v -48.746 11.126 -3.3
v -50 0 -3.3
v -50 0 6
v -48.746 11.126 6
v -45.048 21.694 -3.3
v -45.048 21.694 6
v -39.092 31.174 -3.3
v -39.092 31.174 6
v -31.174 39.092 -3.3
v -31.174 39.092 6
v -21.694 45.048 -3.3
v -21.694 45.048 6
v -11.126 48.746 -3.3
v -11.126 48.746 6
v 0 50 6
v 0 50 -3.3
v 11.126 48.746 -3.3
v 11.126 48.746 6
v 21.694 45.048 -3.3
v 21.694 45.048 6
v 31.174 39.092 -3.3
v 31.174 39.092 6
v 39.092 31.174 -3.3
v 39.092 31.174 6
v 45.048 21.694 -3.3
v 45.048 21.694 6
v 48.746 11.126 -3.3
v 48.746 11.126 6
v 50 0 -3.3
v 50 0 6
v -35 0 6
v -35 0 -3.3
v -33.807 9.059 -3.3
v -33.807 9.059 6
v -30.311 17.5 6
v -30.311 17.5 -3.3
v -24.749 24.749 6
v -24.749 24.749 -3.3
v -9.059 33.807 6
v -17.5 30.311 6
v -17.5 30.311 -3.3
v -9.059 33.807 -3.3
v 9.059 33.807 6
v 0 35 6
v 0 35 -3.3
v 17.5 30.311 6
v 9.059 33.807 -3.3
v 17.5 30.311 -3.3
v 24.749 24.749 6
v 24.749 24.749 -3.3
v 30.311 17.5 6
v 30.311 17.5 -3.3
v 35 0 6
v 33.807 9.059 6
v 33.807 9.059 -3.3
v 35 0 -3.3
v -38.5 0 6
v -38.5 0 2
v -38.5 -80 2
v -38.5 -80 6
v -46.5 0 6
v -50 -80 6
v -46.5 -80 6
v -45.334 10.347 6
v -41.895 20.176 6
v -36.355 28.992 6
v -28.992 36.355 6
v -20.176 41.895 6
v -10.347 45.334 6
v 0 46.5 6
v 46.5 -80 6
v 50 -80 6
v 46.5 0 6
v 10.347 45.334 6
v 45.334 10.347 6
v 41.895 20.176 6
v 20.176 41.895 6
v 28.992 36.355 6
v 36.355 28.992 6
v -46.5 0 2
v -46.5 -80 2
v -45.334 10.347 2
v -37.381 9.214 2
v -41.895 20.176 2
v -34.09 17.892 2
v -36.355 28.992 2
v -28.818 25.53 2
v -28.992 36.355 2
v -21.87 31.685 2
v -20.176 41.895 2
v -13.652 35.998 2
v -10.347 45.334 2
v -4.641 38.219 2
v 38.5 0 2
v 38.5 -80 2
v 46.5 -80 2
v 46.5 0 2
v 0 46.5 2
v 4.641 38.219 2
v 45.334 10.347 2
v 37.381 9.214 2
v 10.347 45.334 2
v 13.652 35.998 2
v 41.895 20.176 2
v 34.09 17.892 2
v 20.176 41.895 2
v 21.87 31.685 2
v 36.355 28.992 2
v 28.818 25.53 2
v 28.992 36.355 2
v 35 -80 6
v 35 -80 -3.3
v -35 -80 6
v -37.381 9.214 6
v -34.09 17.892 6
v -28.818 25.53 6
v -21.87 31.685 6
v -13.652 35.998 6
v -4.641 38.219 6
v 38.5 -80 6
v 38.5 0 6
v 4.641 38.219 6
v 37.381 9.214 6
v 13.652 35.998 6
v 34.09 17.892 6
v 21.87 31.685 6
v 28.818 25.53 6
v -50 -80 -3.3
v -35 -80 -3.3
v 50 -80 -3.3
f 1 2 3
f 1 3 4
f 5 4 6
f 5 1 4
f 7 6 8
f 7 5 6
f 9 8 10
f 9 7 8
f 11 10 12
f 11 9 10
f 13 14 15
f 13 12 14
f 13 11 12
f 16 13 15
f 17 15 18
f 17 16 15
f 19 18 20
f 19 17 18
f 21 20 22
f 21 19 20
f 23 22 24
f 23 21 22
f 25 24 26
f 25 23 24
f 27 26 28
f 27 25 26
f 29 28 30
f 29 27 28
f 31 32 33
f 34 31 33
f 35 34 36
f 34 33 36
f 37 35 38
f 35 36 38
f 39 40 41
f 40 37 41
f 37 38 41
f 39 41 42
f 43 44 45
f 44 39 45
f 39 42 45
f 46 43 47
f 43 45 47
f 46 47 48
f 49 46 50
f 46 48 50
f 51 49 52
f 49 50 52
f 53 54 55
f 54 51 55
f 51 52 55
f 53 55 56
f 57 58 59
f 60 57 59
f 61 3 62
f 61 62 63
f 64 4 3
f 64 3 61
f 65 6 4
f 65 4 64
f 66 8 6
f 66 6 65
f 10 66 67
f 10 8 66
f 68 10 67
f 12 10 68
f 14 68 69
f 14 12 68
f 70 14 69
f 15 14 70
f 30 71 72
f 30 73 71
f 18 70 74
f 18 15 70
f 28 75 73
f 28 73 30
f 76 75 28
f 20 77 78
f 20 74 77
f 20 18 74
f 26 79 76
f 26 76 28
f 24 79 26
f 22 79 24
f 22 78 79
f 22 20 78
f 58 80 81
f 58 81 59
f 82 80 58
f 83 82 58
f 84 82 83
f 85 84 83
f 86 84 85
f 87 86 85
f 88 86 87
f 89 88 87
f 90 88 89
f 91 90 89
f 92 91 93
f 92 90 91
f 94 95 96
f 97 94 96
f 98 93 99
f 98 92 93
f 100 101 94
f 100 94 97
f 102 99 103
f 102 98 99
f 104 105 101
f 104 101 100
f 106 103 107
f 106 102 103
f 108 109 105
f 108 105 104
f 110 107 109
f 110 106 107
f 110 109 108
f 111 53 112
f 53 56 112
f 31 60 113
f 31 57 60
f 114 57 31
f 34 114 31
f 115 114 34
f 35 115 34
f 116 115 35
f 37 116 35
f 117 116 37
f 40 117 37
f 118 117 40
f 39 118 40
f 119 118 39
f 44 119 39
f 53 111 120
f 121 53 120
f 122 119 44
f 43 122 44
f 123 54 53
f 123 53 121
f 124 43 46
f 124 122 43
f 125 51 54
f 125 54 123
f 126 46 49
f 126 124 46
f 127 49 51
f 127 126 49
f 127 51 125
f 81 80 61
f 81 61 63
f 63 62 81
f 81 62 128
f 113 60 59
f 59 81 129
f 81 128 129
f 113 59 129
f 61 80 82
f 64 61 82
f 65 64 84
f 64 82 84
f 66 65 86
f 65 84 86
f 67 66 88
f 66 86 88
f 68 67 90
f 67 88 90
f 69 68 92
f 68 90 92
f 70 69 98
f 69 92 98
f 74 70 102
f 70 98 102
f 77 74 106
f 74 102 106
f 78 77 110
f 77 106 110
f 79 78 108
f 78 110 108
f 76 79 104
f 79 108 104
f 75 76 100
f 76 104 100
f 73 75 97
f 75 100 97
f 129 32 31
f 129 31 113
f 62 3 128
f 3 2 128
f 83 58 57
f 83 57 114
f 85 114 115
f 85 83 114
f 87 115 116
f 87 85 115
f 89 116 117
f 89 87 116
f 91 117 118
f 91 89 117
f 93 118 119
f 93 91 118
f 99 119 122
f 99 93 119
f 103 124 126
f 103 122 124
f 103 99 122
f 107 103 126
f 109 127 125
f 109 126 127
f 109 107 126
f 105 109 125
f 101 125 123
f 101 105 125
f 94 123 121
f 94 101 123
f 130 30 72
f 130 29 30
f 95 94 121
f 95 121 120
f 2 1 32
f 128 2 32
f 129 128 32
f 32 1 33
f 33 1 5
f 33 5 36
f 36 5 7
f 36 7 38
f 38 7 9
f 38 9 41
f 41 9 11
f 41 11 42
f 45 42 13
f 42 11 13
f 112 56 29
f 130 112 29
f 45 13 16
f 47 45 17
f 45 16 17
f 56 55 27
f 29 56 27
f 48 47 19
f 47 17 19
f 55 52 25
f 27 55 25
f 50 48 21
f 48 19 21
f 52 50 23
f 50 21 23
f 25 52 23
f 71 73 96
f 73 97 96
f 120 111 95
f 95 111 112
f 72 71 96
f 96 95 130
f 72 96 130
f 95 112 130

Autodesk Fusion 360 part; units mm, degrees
sketch "Sketch1" plane through (0, 0, 0) normal (0, 0, 1) x (1, 0, 0)
  line L0 (-65, 0) -> (67.0686, 0)
  line L1 (-35, 0) -> (-35, -80)
  line L2 (-50, 0) -> (-50, -80)
  line L3 (35, 0) -> (35, -80)
  line L4 (50, 0) -> (50, -80)
  line L5 (35, -80) -> (50, -80)
  line L6 (-50, -80) -> (-35, -80)
  arc A0 (35, 0) -> (-35, 0) centre (0, 0) ccw
  arc A1 (50, 0) -> (-50, 0) centre (0, 0) ccw
  arc A2 (38.5, 0) -> (-38.5, 0) centre (0, 0) ccw
  arc A3 (46.5, 0) -> (-46.5, 0) centre (0, 0) ccw
  line L7 (-38.5, 0) -> (-38.5, -80)
  line L8 (-46.5, 0) -> (-46.5, -80)
  line L9 (38.5, 0) -> (38.5, -80)
  line L10 (46.5, 0) -> (46.5, -80)
  dimension "d1" = 70
  dimension "d2" = 100
  dimension "d3" = 80
  dimension "d4" = 80
  dimension "d5" = 80
  dimension "d8" = 77
  dimension "d9" = 93
extrude "Extrude2" add sketch "Sketch1" along normal blind 6 contours L0 A1 A3 | L0 L2 L6 L8 | L0 L4 L5 L10 | L0 A0 A2 | L0 L1 L6 L7 | L0 L3 L5 L9 makes body 1 at (36.1667, -53.3333, 0) makes body 2 at (-47.6667, -53.3333, 0)
extrude "Extrude3" add sketch "Sketch1" along normal blind 2 separate body contours L0 A2 A3 | L0 L6 L7 L8 | L0 L5 L9 L10 makes body 3
extrude "Extrude4" add sketch "Sketch1" against normal blind 3.3 contours L0 A1 A3 | L0 L2 L6 L8 | L0 A2 A3 | L0 L6 L7 L8 | L0 L4 L5 L10 | L0 A0 A2 | L0 L1 L6 L7 | L0 L5 L9 L10 | L0 L3 L5 L9 bodies 1 2 3
